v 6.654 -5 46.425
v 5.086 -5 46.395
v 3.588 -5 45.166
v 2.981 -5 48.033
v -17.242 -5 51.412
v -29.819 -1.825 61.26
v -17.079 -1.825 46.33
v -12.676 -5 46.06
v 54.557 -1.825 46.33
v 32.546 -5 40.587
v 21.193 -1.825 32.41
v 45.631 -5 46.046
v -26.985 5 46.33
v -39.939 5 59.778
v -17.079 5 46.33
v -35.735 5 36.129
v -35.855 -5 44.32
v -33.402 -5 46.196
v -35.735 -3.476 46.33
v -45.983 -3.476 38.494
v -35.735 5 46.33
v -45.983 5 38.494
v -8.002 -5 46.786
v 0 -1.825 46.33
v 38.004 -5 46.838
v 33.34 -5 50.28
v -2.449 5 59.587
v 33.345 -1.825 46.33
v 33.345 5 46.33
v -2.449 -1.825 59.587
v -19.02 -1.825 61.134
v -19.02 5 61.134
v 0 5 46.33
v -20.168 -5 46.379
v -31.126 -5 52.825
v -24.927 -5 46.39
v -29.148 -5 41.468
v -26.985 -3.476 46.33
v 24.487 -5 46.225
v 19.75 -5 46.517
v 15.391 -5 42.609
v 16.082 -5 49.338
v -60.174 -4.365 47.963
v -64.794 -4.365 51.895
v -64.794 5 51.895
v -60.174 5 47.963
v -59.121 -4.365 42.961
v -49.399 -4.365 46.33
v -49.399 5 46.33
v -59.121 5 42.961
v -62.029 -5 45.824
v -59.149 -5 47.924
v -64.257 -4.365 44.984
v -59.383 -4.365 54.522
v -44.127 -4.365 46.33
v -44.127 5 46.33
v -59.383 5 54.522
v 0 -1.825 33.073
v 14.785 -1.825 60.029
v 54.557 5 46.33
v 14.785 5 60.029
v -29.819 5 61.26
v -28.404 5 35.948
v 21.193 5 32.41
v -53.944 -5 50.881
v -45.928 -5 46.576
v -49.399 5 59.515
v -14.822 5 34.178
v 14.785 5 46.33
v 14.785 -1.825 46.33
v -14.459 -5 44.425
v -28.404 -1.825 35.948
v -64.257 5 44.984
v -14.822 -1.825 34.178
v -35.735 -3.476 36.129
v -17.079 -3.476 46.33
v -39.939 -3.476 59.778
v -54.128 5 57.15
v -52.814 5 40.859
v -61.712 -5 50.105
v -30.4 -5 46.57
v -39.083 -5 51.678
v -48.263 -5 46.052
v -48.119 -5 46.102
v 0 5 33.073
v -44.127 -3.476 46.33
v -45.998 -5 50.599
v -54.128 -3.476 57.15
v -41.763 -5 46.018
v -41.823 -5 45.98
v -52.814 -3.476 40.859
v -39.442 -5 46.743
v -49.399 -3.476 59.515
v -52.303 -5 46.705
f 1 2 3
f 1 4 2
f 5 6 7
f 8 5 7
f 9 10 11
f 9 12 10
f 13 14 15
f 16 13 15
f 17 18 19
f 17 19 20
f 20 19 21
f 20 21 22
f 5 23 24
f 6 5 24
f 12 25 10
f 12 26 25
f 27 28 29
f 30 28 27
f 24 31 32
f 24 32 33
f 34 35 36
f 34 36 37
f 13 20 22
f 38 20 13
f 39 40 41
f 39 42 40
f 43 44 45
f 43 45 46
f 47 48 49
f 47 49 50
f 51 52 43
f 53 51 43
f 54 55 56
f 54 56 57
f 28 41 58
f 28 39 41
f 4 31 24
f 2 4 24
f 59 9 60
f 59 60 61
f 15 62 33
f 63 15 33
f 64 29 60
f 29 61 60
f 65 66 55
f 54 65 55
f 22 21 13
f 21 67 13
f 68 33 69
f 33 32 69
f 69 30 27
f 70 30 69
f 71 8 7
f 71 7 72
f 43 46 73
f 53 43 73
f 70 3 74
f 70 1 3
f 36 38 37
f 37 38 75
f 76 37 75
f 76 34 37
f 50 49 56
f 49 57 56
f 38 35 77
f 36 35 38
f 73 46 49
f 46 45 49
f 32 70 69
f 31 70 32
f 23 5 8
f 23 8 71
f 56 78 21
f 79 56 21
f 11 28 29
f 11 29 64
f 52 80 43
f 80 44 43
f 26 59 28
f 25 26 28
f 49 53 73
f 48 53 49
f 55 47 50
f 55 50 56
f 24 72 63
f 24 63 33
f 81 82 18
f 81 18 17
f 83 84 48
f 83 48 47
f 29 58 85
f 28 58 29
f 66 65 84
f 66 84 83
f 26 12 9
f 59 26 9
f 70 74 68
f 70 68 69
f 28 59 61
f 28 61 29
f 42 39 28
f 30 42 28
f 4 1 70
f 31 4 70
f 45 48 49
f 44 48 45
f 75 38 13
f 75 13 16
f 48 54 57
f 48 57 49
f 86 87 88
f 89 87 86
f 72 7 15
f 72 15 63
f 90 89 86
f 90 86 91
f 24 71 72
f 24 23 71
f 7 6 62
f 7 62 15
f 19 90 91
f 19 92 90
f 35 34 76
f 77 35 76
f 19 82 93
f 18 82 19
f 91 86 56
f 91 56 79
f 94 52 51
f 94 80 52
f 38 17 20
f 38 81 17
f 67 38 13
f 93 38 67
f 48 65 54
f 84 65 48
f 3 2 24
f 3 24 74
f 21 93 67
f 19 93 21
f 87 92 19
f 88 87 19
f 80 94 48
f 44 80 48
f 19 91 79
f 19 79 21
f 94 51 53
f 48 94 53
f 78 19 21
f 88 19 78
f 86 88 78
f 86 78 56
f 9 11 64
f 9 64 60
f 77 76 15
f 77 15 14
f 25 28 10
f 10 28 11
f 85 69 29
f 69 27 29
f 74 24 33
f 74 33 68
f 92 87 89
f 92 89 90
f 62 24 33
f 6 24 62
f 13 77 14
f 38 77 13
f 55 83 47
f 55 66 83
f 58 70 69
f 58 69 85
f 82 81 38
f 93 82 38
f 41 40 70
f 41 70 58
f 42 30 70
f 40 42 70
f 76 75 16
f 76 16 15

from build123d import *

# Parameters (mm, degrees)
F1_DEPTH   = 5
F2_SIZE2   = 1.524
F2_SIZE    = 1.524
F2_2_SIZE2 = 1.524
F2_2_SIZE  = 1.524
F2_3_SIZE2 = 1.524
F2_3_SIZE  = 1.524
F3_SIZE    = 0.635
F3_2_SIZE  = 0.635
F4_SIZE2   = 3.175
F4_SIZE    = 3.175
F4_2_SIZE2 = 3.175
F4_2_SIZE  = 3.175
F4_3_SIZE2 = 3.175
F4_3_SIZE  = 3.175
F4_4_SIZE2 = 3.175
F4_4_SIZE  = 3.175


with BuildPart() as f1:
    # F0 (on Front) → F1 (new body, symmetric)
    with BuildSketch(Plane.XZ):
        Polygon((-49.3986196816, 46.3301427662), (-64.7941529751, 51.8946684897), (-60.1737983525, 47.9626767337), (-64.2570853233, 44.9842847884), align=None)
    extrude(amount=F1_DEPTH, both=True)

    # F3
    f3_edges = [f1.edges().sort_by_distance(p)[0] for p in [
        (-56.827853, -5, 45.657214),
        (-57.096386, -5, 49.112406),
        (-62.483976, -5, 49.928673),
        (-62.215442, -5, 46.473481),
    ]]
    chamfer(f3_edges, length=F3_SIZE)


with BuildPart() as f1b:
    # F0 (on Front) → F1, piece 2 (new body, symmetric)
    with BuildSketch(Plane.XZ):
        Polygon((14.7852934897, 60.0292161107), (33.3453305066, 46.3301427662), (21.1929194629, 32.4101150036), (54.5567907393, 46.3301427662), align=None)
    extrude(amount=F1_DEPTH, both=True)

    # F4#3
    f4_3_edges = [f1b.edges().sort_by_distance(p)[0] for p in [
        (24.065312, -5, 53.179679),
        (27.269125, -5, 39.370129),
        (37.874855, -5, 39.370129),
        (34.671042, -5, 53.179679),
    ]]
    chamfer(f4_3_edges, length=F4_3_SIZE, length2=F4_3_SIZE2)


with BuildPart() as f1c:
    # F0 (on Front) → F1, piece 3 (new body, symmetric)
    with BuildSketch(Plane.XZ):
        Polygon((-2.4490260985, 59.5873072743), (14.7852934897, 46.3301427662), (0, 33.0729745328), (33.3453305066, 46.3301427662), align=None)
    extrude(amount=F1_DEPTH, both=True)

    # F4#4
    f4_4_edges = [f1c.edges().sort_by_distance(p)[0] for p in [
        (15.448152, -5, 52.958725),
        (6.168134, -5, 52.958725),
        (7.392647, -5, 39.701559),
        (16.672665, -5, 39.701559),
    ]]
    chamfer(f4_4_edges, length=F4_4_SIZE, length2=F4_4_SIZE2)


with BuildPart() as f1d:
    # F0 (on Front) → F1, piece 4 (new body, symmetric)
    with BuildSketch(Plane.XZ):
        Polygon((-19.0204828978, 61.1339770257), (0, 46.3301427662), (-14.8223834112, 34.1777391732), (14.7852934897, 46.3301427662), align=None)
    extrude(amount=F1_DEPTH, both=True)

    # F4#2
    f4_2_edges = [f1d.edges().sort_by_distance(p)[0] for p in [
        (-9.510241, -5, 53.73206),
        (-7.411192, -5, 40.253941),
        (-0.018545, -5, 40.253941),
        (-2.117595, -5, 53.73206),
    ]]
    chamfer(f4_2_edges, length=F4_2_SIZE, length2=F4_2_SIZE2)


with BuildPart() as f1e:
    # F0 (on Front) → F1, piece 5 (new body, symmetric)
    with BuildSketch(Plane.XZ):
        Polygon((-29.8187098791, 61.2595459289), (-17.0794726744, 46.3301427662), (-28.4036499583, 35.9476091376), (0, 46.3301427662), align=None)
    extrude(amount=F1_DEPTH, both=True)

    # F4
    f4_edges = [f1e.edges().sort_by_distance(p)[0] for p in [
        (-14.201825, -5, 41.138876),
        (-14.909355, -5, 53.794844),
        (-23.449091, -5, 53.794844),
        (-22.741561, -5, 41.138876),
    ]]
    chamfer(f4_edges, length=F4_SIZE, length2=F4_SIZE2)


with BuildPart() as f1f:
    # F0 (on Front) → F1, piece 6 (new body, symmetric)
    with BuildSketch(Plane.XZ):
        Polygon((-39.9393104017, 59.7775876522), (-26.9854573235, 46.3301427662), (-35.7351712883, 36.1293107271), (-17.0794726744, 46.3301427662), align=None)
    extrude(amount=F1_DEPTH, both=True)

    # F2#2
    f2_2_edges = [f1f.edges().sort_by_distance(p)[0] for p in [
        (-26.407322, -5, 41.229727),
        (-28.509392, -5, 53.053865),
        (-33.462384, -5, 53.053865),
        (-31.360314, -5, 41.229727),
    ]]
    chamfer(f2_2_edges, length=F2_2_SIZE, length2=F2_2_SIZE2)


with BuildPart() as f1g:
    # F0 (on Front) → F1, piece 7 (new body, symmetric)
    with BuildSketch(Plane.XZ):
        Polygon((-49.3986196816, 59.5148280263), (-35.7351712883, 46.3301427662), (-45.9827594459, 38.4941399097), (-26.9854573235, 46.3301427662), align=None)
    extrude(amount=F1_DEPTH, both=True)

    # F2#3
    f2_3_edges = [f1g.edges().sort_by_distance(p)[0] for p in [
        (-36.484108, -5, 42.412141),
        (-38.192039, -5, 52.922485),
        (-42.566895, -5, 52.922485),
        (-40.858965, -5, 42.412141),
    ]]
    chamfer(f2_3_edges, length=F2_3_SIZE, length2=F2_3_SIZE2)


with BuildPart() as f1h:
    # F0 (on Front) → F1, piece 8 (new body, symmetric)
    with BuildSketch(Plane.XZ):
        Polygon((-54.1282743216, 57.150002569), (-44.1273974836, 46.3301427662), (-52.8144836426, 40.8589653671), (-35.7351712883, 46.3301427662), align=None)
    extrude(amount=F1_DEPTH, both=True)

    # F2
    f2_edges = [f1h.edges().sort_by_distance(p)[0] for p in [
        (-44.931723, -5, 51.740073),
        (-49.127836, -5, 51.740073),
        (-48.470941, -5, 43.594554),
        (-44.274827, -5, 43.594554),
    ]]
    chamfer(f2_edges, length=F2_SIZE, length2=F2_SIZE2)


with BuildPart() as f1i:
    # F0 (on Front) → F1, piece 9 (new body, symmetric)
    with BuildSketch(Plane.XZ):
        Polygon((-59.3834482133, 54.5224137604), (-49.3986196816, 46.3301427662), (-59.1206923127, 42.9610349238), (-44.1273974836, 46.3301427662), align=None)
    extrude(amount=F1_DEPTH, both=True)

    # F3#2
    f3_2_edges = [f1i.edges().sort_by_distance(p)[0] for p in [
        (-51.755423, -5, 50.426278),
        (-54.391034, -5, 50.426278),
        (-51.624045, -5, 44.645589),
        (-54.259656, -5, 44.645589),
    ]]
    chamfer(f3_2_edges, length=F3_2_SIZE)


solid = Compound([f1.part, f1b.part, f1c.part, f1d.part, f1e.part, f1f.part, f1g.part, f1h.part, f1i.part])
